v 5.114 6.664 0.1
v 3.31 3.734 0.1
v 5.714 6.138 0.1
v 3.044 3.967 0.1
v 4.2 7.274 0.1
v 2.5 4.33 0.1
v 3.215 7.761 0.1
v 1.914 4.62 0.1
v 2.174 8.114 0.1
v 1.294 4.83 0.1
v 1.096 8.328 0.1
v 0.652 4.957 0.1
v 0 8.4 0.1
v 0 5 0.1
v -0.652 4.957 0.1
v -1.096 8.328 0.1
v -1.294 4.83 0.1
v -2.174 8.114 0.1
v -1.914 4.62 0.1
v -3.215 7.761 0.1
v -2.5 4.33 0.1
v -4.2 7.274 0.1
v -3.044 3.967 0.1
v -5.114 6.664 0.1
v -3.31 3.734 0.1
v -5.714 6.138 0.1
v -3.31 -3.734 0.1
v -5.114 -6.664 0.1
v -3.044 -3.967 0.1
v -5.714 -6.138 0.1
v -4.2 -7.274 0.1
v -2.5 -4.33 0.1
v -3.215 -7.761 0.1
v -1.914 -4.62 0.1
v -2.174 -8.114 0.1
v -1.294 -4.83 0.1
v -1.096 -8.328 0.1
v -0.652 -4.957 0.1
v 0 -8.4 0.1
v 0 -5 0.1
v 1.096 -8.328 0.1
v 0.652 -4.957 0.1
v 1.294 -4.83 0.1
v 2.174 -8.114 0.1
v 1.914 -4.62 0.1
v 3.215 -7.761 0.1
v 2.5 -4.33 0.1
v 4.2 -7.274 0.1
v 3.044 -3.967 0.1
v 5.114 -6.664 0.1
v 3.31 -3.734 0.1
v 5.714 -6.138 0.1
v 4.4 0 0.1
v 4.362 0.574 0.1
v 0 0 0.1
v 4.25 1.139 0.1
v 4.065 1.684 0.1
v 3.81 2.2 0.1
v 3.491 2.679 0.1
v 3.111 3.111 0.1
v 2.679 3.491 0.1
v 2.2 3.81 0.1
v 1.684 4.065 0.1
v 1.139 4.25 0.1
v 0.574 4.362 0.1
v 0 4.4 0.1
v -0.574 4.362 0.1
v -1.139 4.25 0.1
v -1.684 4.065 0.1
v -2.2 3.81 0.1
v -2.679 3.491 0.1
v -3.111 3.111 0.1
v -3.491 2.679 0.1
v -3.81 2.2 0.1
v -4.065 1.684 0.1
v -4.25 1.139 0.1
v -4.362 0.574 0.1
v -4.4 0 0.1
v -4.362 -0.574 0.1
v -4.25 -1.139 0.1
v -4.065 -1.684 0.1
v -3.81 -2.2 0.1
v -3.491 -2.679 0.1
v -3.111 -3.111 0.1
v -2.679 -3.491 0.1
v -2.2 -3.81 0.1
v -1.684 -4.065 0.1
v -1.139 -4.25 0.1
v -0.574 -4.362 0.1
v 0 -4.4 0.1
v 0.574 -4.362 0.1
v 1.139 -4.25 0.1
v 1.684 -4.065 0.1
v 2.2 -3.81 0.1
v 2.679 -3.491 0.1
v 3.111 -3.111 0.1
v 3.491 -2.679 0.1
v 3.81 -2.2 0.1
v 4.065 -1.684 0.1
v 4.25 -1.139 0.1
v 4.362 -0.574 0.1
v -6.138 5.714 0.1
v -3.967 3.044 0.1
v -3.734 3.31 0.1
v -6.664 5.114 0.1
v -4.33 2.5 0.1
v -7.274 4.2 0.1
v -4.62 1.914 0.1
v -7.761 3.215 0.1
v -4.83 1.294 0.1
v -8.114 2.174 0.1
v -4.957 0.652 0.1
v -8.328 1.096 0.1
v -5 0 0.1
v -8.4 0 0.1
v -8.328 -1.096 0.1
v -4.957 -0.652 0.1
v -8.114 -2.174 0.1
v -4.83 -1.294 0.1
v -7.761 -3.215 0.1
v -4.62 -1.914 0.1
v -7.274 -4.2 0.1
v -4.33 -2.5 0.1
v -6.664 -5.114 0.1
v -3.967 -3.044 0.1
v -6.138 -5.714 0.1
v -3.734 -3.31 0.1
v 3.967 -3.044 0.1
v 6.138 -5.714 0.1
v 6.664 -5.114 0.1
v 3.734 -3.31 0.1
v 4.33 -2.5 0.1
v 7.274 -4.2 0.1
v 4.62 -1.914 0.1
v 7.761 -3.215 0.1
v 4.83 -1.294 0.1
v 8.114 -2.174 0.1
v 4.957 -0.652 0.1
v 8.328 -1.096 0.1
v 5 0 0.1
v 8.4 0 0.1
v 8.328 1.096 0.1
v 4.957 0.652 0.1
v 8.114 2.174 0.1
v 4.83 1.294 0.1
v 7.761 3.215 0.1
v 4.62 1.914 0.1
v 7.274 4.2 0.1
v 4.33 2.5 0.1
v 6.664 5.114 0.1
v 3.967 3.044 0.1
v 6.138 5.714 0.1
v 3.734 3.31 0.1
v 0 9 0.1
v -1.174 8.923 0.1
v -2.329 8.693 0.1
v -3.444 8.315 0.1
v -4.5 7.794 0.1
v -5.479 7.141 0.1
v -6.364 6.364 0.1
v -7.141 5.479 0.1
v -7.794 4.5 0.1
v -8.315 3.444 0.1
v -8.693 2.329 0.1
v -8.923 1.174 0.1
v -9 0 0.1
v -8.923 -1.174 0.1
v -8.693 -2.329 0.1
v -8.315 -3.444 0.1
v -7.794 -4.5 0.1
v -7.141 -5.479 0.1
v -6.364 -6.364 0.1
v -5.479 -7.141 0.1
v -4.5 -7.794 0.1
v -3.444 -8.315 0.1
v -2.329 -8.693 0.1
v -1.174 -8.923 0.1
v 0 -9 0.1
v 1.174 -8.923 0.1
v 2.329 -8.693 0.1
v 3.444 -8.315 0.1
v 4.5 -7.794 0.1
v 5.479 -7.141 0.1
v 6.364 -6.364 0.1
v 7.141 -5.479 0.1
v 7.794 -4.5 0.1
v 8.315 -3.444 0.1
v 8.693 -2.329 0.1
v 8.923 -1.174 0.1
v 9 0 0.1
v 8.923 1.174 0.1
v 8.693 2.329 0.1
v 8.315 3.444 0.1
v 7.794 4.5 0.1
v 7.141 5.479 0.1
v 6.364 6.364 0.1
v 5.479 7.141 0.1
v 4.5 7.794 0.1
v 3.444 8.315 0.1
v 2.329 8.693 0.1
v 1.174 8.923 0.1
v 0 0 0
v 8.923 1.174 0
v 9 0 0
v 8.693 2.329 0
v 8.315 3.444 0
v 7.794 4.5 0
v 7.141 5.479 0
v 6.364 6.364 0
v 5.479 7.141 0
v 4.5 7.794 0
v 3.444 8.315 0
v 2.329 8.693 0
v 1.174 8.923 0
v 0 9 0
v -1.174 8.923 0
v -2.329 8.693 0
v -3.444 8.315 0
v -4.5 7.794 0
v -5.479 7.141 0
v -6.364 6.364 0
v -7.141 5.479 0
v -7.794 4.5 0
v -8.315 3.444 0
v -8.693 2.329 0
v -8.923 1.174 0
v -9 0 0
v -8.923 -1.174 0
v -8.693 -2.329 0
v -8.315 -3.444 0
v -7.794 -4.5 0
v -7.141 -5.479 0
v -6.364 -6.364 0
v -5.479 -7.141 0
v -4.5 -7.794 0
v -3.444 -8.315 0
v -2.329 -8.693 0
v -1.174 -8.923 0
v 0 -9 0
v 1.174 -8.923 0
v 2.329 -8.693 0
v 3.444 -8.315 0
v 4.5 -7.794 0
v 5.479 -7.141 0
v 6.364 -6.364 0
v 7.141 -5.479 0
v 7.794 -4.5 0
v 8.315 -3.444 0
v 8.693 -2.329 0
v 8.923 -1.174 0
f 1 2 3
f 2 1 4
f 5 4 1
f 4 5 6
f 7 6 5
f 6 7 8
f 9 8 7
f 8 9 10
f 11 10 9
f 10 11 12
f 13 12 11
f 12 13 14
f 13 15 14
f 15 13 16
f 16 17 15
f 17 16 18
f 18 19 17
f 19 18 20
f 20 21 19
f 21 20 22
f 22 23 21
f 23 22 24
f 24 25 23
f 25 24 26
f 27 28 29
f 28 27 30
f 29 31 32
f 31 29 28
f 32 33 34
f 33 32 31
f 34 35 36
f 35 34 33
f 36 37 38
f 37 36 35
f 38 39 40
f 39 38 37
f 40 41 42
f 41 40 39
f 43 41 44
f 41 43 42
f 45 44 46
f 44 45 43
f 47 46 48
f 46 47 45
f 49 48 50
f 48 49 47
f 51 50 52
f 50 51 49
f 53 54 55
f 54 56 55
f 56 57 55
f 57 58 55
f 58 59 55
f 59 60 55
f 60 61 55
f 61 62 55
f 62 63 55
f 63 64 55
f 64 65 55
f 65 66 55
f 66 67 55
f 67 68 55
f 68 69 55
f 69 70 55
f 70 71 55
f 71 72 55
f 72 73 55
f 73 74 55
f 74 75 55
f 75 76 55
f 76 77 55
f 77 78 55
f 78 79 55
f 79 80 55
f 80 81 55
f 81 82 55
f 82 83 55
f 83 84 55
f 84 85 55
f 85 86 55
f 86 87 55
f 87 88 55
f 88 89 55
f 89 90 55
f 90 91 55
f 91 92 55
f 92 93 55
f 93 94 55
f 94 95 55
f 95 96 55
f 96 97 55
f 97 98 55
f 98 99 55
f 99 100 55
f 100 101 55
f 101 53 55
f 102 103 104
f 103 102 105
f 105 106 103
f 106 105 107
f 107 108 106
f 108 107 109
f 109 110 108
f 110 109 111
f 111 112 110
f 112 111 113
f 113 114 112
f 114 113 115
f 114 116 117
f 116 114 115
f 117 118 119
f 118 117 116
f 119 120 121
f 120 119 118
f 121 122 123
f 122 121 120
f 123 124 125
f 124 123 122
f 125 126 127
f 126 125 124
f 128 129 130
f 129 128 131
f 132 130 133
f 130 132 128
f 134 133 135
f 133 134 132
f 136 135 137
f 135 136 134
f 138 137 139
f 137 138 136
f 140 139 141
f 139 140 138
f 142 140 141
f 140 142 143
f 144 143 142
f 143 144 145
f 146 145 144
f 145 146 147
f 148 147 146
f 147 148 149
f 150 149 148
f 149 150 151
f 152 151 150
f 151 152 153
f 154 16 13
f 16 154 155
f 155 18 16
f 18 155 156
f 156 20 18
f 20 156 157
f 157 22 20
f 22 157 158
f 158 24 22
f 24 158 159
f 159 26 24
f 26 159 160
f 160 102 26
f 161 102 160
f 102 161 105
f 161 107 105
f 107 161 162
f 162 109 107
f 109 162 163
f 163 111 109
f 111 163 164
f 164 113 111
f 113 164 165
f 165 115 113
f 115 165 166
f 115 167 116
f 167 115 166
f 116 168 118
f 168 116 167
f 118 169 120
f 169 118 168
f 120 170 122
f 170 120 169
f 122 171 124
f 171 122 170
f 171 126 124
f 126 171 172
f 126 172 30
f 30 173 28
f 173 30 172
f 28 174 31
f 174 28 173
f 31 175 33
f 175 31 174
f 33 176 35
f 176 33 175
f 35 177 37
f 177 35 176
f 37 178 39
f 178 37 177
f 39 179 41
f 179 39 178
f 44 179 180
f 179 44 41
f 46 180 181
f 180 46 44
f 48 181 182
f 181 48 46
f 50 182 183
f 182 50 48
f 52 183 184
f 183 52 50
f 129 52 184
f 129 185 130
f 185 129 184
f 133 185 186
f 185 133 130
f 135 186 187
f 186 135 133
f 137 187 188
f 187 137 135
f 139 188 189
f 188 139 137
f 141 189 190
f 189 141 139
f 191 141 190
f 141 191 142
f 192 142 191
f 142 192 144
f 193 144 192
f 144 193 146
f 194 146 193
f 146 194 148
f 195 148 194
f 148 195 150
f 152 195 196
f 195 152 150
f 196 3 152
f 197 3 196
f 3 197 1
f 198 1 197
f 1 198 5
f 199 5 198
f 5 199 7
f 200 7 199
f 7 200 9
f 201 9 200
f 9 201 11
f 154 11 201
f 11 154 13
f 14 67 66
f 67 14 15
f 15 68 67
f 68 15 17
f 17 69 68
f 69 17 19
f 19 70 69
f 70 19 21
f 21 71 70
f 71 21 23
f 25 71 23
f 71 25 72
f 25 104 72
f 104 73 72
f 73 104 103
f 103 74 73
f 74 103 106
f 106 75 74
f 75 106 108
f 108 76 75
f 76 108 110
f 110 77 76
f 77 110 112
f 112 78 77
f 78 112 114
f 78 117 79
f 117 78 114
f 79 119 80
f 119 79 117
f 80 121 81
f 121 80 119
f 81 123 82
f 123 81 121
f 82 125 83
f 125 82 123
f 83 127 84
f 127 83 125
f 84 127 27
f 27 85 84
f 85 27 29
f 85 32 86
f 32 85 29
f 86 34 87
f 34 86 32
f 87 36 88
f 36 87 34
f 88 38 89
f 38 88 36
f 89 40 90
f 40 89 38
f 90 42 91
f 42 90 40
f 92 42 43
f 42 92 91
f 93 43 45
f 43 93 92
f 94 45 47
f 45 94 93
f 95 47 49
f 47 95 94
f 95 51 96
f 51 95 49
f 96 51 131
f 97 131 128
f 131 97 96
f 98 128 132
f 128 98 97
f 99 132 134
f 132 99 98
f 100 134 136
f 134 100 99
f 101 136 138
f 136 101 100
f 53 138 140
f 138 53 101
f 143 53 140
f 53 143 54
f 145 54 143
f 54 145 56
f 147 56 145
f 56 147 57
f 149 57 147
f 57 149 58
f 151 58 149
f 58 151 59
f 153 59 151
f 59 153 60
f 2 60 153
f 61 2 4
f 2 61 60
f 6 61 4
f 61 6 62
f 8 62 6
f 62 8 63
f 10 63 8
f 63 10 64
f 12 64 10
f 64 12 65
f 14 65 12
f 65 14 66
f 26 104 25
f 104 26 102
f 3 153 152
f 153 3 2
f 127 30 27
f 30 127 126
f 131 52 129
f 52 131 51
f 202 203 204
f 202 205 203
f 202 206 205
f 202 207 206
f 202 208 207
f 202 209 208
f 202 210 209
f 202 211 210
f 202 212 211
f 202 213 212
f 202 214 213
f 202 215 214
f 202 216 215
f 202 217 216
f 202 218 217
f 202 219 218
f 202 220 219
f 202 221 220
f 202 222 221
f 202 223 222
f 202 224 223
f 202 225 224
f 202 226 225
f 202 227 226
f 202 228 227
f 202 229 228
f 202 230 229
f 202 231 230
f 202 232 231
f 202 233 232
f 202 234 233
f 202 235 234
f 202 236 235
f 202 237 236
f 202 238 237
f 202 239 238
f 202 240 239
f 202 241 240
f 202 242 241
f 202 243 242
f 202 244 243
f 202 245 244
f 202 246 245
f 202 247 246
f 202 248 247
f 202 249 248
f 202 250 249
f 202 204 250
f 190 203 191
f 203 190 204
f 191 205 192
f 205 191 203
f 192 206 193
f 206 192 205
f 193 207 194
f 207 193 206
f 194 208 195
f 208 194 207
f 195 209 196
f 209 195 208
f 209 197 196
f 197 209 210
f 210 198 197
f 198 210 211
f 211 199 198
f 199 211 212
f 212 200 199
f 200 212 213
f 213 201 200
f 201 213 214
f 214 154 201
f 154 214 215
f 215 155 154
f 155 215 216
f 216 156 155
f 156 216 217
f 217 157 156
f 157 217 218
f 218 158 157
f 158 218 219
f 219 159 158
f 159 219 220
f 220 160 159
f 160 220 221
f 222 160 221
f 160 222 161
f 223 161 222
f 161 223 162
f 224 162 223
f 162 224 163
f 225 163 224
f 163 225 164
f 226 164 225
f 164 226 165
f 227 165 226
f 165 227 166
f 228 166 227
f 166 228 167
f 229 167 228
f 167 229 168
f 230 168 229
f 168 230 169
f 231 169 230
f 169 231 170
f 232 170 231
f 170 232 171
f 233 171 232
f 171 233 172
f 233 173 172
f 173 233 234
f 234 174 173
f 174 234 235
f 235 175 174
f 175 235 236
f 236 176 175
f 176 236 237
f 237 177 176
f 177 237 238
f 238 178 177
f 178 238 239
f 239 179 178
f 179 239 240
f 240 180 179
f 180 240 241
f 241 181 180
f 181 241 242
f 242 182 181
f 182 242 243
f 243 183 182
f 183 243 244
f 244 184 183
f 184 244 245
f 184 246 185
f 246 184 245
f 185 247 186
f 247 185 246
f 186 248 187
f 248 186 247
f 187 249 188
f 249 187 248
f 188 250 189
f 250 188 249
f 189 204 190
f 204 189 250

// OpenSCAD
use <../lib.scad>
use <../p/48/4-4cyli.scad>
use <../p/48/4-4disc.scad>
use <s/004488es01.scad>
$fa=1; $fs=0.2;
function ldraw_lib__004488e(realsolid=false) = [
// 0 Sticker  2.3 x  2.3 Round with Lifepreserver
// 0 Name: 004488e.dat
// 0 Author: Willy Tschager [Holly-Wood]
// 0 !LDRAW_ORG Part UPDATE 2022-01
// 0 !LICENSE Licensed under CC BY 2.0 and CC BY 4.0 : see CAreadme.txt
// 
// 0 BFC CERTIFY CCW
  [0,"BFC","CERTIFY"],
  [0,"BFC","CCW"],
// 
// 0 !KEYWORDS buoy, coastguard, dock, harbor, harbour, life ring, lifeguard
// 0 !KEYWORDS police, port, rescue, salvage, set 364, set 369, wharf
// 
// 0 !HISTORY 2020-06-28 [PTadmin] Official Update 2020-01
// 0 !HISTORY 2020-08-25 [Holly-Wood] separated pattern into subfile
// 0 !HISTORY 2022-01-14 [PTadmin] Official Update 2022-01
// 
// 
// 0 // Pattern
// 1 16 0 0 0 1 0 0 0 1 0 0 0 1 s\004488es01.dat
  [1,16,0,0,0,1,0,0,0,1,0,0,0,1, ldraw_lib__s__004488es01(realsolid)],
// 
// 0 // Small cylinder
// 1 16 0 0 0 22.5 0 0 0 -1 0 0 0 22.5 48\4-4disc.dat
  [1,16,0,0,0,22.5,0,0,0,-1,0,0,0,22.5, ldraw_lib__48__4_4disc(realsolid)],
// 1 16 0 -.25 0 22.5 0 0 0 .25 0 0 0 22.5 48\4-4cyli.dat
  [1,16,0,-.25,0,22.5,0,0,0,.25,0,0,0,22.5, ldraw_lib__48__4_4cyli(realsolid)],
];
module ldraw_lib__004488e(step=0, col=false, unit=2/5, alt=false, line=0.2, solid=!$preview)
    makepoly(ldraw_lib__004488e(solid), step=step, col=col, unit=unit, alt=alt, line=line, solid=solid);
ldraw_lib__004488e(line=0.2);
